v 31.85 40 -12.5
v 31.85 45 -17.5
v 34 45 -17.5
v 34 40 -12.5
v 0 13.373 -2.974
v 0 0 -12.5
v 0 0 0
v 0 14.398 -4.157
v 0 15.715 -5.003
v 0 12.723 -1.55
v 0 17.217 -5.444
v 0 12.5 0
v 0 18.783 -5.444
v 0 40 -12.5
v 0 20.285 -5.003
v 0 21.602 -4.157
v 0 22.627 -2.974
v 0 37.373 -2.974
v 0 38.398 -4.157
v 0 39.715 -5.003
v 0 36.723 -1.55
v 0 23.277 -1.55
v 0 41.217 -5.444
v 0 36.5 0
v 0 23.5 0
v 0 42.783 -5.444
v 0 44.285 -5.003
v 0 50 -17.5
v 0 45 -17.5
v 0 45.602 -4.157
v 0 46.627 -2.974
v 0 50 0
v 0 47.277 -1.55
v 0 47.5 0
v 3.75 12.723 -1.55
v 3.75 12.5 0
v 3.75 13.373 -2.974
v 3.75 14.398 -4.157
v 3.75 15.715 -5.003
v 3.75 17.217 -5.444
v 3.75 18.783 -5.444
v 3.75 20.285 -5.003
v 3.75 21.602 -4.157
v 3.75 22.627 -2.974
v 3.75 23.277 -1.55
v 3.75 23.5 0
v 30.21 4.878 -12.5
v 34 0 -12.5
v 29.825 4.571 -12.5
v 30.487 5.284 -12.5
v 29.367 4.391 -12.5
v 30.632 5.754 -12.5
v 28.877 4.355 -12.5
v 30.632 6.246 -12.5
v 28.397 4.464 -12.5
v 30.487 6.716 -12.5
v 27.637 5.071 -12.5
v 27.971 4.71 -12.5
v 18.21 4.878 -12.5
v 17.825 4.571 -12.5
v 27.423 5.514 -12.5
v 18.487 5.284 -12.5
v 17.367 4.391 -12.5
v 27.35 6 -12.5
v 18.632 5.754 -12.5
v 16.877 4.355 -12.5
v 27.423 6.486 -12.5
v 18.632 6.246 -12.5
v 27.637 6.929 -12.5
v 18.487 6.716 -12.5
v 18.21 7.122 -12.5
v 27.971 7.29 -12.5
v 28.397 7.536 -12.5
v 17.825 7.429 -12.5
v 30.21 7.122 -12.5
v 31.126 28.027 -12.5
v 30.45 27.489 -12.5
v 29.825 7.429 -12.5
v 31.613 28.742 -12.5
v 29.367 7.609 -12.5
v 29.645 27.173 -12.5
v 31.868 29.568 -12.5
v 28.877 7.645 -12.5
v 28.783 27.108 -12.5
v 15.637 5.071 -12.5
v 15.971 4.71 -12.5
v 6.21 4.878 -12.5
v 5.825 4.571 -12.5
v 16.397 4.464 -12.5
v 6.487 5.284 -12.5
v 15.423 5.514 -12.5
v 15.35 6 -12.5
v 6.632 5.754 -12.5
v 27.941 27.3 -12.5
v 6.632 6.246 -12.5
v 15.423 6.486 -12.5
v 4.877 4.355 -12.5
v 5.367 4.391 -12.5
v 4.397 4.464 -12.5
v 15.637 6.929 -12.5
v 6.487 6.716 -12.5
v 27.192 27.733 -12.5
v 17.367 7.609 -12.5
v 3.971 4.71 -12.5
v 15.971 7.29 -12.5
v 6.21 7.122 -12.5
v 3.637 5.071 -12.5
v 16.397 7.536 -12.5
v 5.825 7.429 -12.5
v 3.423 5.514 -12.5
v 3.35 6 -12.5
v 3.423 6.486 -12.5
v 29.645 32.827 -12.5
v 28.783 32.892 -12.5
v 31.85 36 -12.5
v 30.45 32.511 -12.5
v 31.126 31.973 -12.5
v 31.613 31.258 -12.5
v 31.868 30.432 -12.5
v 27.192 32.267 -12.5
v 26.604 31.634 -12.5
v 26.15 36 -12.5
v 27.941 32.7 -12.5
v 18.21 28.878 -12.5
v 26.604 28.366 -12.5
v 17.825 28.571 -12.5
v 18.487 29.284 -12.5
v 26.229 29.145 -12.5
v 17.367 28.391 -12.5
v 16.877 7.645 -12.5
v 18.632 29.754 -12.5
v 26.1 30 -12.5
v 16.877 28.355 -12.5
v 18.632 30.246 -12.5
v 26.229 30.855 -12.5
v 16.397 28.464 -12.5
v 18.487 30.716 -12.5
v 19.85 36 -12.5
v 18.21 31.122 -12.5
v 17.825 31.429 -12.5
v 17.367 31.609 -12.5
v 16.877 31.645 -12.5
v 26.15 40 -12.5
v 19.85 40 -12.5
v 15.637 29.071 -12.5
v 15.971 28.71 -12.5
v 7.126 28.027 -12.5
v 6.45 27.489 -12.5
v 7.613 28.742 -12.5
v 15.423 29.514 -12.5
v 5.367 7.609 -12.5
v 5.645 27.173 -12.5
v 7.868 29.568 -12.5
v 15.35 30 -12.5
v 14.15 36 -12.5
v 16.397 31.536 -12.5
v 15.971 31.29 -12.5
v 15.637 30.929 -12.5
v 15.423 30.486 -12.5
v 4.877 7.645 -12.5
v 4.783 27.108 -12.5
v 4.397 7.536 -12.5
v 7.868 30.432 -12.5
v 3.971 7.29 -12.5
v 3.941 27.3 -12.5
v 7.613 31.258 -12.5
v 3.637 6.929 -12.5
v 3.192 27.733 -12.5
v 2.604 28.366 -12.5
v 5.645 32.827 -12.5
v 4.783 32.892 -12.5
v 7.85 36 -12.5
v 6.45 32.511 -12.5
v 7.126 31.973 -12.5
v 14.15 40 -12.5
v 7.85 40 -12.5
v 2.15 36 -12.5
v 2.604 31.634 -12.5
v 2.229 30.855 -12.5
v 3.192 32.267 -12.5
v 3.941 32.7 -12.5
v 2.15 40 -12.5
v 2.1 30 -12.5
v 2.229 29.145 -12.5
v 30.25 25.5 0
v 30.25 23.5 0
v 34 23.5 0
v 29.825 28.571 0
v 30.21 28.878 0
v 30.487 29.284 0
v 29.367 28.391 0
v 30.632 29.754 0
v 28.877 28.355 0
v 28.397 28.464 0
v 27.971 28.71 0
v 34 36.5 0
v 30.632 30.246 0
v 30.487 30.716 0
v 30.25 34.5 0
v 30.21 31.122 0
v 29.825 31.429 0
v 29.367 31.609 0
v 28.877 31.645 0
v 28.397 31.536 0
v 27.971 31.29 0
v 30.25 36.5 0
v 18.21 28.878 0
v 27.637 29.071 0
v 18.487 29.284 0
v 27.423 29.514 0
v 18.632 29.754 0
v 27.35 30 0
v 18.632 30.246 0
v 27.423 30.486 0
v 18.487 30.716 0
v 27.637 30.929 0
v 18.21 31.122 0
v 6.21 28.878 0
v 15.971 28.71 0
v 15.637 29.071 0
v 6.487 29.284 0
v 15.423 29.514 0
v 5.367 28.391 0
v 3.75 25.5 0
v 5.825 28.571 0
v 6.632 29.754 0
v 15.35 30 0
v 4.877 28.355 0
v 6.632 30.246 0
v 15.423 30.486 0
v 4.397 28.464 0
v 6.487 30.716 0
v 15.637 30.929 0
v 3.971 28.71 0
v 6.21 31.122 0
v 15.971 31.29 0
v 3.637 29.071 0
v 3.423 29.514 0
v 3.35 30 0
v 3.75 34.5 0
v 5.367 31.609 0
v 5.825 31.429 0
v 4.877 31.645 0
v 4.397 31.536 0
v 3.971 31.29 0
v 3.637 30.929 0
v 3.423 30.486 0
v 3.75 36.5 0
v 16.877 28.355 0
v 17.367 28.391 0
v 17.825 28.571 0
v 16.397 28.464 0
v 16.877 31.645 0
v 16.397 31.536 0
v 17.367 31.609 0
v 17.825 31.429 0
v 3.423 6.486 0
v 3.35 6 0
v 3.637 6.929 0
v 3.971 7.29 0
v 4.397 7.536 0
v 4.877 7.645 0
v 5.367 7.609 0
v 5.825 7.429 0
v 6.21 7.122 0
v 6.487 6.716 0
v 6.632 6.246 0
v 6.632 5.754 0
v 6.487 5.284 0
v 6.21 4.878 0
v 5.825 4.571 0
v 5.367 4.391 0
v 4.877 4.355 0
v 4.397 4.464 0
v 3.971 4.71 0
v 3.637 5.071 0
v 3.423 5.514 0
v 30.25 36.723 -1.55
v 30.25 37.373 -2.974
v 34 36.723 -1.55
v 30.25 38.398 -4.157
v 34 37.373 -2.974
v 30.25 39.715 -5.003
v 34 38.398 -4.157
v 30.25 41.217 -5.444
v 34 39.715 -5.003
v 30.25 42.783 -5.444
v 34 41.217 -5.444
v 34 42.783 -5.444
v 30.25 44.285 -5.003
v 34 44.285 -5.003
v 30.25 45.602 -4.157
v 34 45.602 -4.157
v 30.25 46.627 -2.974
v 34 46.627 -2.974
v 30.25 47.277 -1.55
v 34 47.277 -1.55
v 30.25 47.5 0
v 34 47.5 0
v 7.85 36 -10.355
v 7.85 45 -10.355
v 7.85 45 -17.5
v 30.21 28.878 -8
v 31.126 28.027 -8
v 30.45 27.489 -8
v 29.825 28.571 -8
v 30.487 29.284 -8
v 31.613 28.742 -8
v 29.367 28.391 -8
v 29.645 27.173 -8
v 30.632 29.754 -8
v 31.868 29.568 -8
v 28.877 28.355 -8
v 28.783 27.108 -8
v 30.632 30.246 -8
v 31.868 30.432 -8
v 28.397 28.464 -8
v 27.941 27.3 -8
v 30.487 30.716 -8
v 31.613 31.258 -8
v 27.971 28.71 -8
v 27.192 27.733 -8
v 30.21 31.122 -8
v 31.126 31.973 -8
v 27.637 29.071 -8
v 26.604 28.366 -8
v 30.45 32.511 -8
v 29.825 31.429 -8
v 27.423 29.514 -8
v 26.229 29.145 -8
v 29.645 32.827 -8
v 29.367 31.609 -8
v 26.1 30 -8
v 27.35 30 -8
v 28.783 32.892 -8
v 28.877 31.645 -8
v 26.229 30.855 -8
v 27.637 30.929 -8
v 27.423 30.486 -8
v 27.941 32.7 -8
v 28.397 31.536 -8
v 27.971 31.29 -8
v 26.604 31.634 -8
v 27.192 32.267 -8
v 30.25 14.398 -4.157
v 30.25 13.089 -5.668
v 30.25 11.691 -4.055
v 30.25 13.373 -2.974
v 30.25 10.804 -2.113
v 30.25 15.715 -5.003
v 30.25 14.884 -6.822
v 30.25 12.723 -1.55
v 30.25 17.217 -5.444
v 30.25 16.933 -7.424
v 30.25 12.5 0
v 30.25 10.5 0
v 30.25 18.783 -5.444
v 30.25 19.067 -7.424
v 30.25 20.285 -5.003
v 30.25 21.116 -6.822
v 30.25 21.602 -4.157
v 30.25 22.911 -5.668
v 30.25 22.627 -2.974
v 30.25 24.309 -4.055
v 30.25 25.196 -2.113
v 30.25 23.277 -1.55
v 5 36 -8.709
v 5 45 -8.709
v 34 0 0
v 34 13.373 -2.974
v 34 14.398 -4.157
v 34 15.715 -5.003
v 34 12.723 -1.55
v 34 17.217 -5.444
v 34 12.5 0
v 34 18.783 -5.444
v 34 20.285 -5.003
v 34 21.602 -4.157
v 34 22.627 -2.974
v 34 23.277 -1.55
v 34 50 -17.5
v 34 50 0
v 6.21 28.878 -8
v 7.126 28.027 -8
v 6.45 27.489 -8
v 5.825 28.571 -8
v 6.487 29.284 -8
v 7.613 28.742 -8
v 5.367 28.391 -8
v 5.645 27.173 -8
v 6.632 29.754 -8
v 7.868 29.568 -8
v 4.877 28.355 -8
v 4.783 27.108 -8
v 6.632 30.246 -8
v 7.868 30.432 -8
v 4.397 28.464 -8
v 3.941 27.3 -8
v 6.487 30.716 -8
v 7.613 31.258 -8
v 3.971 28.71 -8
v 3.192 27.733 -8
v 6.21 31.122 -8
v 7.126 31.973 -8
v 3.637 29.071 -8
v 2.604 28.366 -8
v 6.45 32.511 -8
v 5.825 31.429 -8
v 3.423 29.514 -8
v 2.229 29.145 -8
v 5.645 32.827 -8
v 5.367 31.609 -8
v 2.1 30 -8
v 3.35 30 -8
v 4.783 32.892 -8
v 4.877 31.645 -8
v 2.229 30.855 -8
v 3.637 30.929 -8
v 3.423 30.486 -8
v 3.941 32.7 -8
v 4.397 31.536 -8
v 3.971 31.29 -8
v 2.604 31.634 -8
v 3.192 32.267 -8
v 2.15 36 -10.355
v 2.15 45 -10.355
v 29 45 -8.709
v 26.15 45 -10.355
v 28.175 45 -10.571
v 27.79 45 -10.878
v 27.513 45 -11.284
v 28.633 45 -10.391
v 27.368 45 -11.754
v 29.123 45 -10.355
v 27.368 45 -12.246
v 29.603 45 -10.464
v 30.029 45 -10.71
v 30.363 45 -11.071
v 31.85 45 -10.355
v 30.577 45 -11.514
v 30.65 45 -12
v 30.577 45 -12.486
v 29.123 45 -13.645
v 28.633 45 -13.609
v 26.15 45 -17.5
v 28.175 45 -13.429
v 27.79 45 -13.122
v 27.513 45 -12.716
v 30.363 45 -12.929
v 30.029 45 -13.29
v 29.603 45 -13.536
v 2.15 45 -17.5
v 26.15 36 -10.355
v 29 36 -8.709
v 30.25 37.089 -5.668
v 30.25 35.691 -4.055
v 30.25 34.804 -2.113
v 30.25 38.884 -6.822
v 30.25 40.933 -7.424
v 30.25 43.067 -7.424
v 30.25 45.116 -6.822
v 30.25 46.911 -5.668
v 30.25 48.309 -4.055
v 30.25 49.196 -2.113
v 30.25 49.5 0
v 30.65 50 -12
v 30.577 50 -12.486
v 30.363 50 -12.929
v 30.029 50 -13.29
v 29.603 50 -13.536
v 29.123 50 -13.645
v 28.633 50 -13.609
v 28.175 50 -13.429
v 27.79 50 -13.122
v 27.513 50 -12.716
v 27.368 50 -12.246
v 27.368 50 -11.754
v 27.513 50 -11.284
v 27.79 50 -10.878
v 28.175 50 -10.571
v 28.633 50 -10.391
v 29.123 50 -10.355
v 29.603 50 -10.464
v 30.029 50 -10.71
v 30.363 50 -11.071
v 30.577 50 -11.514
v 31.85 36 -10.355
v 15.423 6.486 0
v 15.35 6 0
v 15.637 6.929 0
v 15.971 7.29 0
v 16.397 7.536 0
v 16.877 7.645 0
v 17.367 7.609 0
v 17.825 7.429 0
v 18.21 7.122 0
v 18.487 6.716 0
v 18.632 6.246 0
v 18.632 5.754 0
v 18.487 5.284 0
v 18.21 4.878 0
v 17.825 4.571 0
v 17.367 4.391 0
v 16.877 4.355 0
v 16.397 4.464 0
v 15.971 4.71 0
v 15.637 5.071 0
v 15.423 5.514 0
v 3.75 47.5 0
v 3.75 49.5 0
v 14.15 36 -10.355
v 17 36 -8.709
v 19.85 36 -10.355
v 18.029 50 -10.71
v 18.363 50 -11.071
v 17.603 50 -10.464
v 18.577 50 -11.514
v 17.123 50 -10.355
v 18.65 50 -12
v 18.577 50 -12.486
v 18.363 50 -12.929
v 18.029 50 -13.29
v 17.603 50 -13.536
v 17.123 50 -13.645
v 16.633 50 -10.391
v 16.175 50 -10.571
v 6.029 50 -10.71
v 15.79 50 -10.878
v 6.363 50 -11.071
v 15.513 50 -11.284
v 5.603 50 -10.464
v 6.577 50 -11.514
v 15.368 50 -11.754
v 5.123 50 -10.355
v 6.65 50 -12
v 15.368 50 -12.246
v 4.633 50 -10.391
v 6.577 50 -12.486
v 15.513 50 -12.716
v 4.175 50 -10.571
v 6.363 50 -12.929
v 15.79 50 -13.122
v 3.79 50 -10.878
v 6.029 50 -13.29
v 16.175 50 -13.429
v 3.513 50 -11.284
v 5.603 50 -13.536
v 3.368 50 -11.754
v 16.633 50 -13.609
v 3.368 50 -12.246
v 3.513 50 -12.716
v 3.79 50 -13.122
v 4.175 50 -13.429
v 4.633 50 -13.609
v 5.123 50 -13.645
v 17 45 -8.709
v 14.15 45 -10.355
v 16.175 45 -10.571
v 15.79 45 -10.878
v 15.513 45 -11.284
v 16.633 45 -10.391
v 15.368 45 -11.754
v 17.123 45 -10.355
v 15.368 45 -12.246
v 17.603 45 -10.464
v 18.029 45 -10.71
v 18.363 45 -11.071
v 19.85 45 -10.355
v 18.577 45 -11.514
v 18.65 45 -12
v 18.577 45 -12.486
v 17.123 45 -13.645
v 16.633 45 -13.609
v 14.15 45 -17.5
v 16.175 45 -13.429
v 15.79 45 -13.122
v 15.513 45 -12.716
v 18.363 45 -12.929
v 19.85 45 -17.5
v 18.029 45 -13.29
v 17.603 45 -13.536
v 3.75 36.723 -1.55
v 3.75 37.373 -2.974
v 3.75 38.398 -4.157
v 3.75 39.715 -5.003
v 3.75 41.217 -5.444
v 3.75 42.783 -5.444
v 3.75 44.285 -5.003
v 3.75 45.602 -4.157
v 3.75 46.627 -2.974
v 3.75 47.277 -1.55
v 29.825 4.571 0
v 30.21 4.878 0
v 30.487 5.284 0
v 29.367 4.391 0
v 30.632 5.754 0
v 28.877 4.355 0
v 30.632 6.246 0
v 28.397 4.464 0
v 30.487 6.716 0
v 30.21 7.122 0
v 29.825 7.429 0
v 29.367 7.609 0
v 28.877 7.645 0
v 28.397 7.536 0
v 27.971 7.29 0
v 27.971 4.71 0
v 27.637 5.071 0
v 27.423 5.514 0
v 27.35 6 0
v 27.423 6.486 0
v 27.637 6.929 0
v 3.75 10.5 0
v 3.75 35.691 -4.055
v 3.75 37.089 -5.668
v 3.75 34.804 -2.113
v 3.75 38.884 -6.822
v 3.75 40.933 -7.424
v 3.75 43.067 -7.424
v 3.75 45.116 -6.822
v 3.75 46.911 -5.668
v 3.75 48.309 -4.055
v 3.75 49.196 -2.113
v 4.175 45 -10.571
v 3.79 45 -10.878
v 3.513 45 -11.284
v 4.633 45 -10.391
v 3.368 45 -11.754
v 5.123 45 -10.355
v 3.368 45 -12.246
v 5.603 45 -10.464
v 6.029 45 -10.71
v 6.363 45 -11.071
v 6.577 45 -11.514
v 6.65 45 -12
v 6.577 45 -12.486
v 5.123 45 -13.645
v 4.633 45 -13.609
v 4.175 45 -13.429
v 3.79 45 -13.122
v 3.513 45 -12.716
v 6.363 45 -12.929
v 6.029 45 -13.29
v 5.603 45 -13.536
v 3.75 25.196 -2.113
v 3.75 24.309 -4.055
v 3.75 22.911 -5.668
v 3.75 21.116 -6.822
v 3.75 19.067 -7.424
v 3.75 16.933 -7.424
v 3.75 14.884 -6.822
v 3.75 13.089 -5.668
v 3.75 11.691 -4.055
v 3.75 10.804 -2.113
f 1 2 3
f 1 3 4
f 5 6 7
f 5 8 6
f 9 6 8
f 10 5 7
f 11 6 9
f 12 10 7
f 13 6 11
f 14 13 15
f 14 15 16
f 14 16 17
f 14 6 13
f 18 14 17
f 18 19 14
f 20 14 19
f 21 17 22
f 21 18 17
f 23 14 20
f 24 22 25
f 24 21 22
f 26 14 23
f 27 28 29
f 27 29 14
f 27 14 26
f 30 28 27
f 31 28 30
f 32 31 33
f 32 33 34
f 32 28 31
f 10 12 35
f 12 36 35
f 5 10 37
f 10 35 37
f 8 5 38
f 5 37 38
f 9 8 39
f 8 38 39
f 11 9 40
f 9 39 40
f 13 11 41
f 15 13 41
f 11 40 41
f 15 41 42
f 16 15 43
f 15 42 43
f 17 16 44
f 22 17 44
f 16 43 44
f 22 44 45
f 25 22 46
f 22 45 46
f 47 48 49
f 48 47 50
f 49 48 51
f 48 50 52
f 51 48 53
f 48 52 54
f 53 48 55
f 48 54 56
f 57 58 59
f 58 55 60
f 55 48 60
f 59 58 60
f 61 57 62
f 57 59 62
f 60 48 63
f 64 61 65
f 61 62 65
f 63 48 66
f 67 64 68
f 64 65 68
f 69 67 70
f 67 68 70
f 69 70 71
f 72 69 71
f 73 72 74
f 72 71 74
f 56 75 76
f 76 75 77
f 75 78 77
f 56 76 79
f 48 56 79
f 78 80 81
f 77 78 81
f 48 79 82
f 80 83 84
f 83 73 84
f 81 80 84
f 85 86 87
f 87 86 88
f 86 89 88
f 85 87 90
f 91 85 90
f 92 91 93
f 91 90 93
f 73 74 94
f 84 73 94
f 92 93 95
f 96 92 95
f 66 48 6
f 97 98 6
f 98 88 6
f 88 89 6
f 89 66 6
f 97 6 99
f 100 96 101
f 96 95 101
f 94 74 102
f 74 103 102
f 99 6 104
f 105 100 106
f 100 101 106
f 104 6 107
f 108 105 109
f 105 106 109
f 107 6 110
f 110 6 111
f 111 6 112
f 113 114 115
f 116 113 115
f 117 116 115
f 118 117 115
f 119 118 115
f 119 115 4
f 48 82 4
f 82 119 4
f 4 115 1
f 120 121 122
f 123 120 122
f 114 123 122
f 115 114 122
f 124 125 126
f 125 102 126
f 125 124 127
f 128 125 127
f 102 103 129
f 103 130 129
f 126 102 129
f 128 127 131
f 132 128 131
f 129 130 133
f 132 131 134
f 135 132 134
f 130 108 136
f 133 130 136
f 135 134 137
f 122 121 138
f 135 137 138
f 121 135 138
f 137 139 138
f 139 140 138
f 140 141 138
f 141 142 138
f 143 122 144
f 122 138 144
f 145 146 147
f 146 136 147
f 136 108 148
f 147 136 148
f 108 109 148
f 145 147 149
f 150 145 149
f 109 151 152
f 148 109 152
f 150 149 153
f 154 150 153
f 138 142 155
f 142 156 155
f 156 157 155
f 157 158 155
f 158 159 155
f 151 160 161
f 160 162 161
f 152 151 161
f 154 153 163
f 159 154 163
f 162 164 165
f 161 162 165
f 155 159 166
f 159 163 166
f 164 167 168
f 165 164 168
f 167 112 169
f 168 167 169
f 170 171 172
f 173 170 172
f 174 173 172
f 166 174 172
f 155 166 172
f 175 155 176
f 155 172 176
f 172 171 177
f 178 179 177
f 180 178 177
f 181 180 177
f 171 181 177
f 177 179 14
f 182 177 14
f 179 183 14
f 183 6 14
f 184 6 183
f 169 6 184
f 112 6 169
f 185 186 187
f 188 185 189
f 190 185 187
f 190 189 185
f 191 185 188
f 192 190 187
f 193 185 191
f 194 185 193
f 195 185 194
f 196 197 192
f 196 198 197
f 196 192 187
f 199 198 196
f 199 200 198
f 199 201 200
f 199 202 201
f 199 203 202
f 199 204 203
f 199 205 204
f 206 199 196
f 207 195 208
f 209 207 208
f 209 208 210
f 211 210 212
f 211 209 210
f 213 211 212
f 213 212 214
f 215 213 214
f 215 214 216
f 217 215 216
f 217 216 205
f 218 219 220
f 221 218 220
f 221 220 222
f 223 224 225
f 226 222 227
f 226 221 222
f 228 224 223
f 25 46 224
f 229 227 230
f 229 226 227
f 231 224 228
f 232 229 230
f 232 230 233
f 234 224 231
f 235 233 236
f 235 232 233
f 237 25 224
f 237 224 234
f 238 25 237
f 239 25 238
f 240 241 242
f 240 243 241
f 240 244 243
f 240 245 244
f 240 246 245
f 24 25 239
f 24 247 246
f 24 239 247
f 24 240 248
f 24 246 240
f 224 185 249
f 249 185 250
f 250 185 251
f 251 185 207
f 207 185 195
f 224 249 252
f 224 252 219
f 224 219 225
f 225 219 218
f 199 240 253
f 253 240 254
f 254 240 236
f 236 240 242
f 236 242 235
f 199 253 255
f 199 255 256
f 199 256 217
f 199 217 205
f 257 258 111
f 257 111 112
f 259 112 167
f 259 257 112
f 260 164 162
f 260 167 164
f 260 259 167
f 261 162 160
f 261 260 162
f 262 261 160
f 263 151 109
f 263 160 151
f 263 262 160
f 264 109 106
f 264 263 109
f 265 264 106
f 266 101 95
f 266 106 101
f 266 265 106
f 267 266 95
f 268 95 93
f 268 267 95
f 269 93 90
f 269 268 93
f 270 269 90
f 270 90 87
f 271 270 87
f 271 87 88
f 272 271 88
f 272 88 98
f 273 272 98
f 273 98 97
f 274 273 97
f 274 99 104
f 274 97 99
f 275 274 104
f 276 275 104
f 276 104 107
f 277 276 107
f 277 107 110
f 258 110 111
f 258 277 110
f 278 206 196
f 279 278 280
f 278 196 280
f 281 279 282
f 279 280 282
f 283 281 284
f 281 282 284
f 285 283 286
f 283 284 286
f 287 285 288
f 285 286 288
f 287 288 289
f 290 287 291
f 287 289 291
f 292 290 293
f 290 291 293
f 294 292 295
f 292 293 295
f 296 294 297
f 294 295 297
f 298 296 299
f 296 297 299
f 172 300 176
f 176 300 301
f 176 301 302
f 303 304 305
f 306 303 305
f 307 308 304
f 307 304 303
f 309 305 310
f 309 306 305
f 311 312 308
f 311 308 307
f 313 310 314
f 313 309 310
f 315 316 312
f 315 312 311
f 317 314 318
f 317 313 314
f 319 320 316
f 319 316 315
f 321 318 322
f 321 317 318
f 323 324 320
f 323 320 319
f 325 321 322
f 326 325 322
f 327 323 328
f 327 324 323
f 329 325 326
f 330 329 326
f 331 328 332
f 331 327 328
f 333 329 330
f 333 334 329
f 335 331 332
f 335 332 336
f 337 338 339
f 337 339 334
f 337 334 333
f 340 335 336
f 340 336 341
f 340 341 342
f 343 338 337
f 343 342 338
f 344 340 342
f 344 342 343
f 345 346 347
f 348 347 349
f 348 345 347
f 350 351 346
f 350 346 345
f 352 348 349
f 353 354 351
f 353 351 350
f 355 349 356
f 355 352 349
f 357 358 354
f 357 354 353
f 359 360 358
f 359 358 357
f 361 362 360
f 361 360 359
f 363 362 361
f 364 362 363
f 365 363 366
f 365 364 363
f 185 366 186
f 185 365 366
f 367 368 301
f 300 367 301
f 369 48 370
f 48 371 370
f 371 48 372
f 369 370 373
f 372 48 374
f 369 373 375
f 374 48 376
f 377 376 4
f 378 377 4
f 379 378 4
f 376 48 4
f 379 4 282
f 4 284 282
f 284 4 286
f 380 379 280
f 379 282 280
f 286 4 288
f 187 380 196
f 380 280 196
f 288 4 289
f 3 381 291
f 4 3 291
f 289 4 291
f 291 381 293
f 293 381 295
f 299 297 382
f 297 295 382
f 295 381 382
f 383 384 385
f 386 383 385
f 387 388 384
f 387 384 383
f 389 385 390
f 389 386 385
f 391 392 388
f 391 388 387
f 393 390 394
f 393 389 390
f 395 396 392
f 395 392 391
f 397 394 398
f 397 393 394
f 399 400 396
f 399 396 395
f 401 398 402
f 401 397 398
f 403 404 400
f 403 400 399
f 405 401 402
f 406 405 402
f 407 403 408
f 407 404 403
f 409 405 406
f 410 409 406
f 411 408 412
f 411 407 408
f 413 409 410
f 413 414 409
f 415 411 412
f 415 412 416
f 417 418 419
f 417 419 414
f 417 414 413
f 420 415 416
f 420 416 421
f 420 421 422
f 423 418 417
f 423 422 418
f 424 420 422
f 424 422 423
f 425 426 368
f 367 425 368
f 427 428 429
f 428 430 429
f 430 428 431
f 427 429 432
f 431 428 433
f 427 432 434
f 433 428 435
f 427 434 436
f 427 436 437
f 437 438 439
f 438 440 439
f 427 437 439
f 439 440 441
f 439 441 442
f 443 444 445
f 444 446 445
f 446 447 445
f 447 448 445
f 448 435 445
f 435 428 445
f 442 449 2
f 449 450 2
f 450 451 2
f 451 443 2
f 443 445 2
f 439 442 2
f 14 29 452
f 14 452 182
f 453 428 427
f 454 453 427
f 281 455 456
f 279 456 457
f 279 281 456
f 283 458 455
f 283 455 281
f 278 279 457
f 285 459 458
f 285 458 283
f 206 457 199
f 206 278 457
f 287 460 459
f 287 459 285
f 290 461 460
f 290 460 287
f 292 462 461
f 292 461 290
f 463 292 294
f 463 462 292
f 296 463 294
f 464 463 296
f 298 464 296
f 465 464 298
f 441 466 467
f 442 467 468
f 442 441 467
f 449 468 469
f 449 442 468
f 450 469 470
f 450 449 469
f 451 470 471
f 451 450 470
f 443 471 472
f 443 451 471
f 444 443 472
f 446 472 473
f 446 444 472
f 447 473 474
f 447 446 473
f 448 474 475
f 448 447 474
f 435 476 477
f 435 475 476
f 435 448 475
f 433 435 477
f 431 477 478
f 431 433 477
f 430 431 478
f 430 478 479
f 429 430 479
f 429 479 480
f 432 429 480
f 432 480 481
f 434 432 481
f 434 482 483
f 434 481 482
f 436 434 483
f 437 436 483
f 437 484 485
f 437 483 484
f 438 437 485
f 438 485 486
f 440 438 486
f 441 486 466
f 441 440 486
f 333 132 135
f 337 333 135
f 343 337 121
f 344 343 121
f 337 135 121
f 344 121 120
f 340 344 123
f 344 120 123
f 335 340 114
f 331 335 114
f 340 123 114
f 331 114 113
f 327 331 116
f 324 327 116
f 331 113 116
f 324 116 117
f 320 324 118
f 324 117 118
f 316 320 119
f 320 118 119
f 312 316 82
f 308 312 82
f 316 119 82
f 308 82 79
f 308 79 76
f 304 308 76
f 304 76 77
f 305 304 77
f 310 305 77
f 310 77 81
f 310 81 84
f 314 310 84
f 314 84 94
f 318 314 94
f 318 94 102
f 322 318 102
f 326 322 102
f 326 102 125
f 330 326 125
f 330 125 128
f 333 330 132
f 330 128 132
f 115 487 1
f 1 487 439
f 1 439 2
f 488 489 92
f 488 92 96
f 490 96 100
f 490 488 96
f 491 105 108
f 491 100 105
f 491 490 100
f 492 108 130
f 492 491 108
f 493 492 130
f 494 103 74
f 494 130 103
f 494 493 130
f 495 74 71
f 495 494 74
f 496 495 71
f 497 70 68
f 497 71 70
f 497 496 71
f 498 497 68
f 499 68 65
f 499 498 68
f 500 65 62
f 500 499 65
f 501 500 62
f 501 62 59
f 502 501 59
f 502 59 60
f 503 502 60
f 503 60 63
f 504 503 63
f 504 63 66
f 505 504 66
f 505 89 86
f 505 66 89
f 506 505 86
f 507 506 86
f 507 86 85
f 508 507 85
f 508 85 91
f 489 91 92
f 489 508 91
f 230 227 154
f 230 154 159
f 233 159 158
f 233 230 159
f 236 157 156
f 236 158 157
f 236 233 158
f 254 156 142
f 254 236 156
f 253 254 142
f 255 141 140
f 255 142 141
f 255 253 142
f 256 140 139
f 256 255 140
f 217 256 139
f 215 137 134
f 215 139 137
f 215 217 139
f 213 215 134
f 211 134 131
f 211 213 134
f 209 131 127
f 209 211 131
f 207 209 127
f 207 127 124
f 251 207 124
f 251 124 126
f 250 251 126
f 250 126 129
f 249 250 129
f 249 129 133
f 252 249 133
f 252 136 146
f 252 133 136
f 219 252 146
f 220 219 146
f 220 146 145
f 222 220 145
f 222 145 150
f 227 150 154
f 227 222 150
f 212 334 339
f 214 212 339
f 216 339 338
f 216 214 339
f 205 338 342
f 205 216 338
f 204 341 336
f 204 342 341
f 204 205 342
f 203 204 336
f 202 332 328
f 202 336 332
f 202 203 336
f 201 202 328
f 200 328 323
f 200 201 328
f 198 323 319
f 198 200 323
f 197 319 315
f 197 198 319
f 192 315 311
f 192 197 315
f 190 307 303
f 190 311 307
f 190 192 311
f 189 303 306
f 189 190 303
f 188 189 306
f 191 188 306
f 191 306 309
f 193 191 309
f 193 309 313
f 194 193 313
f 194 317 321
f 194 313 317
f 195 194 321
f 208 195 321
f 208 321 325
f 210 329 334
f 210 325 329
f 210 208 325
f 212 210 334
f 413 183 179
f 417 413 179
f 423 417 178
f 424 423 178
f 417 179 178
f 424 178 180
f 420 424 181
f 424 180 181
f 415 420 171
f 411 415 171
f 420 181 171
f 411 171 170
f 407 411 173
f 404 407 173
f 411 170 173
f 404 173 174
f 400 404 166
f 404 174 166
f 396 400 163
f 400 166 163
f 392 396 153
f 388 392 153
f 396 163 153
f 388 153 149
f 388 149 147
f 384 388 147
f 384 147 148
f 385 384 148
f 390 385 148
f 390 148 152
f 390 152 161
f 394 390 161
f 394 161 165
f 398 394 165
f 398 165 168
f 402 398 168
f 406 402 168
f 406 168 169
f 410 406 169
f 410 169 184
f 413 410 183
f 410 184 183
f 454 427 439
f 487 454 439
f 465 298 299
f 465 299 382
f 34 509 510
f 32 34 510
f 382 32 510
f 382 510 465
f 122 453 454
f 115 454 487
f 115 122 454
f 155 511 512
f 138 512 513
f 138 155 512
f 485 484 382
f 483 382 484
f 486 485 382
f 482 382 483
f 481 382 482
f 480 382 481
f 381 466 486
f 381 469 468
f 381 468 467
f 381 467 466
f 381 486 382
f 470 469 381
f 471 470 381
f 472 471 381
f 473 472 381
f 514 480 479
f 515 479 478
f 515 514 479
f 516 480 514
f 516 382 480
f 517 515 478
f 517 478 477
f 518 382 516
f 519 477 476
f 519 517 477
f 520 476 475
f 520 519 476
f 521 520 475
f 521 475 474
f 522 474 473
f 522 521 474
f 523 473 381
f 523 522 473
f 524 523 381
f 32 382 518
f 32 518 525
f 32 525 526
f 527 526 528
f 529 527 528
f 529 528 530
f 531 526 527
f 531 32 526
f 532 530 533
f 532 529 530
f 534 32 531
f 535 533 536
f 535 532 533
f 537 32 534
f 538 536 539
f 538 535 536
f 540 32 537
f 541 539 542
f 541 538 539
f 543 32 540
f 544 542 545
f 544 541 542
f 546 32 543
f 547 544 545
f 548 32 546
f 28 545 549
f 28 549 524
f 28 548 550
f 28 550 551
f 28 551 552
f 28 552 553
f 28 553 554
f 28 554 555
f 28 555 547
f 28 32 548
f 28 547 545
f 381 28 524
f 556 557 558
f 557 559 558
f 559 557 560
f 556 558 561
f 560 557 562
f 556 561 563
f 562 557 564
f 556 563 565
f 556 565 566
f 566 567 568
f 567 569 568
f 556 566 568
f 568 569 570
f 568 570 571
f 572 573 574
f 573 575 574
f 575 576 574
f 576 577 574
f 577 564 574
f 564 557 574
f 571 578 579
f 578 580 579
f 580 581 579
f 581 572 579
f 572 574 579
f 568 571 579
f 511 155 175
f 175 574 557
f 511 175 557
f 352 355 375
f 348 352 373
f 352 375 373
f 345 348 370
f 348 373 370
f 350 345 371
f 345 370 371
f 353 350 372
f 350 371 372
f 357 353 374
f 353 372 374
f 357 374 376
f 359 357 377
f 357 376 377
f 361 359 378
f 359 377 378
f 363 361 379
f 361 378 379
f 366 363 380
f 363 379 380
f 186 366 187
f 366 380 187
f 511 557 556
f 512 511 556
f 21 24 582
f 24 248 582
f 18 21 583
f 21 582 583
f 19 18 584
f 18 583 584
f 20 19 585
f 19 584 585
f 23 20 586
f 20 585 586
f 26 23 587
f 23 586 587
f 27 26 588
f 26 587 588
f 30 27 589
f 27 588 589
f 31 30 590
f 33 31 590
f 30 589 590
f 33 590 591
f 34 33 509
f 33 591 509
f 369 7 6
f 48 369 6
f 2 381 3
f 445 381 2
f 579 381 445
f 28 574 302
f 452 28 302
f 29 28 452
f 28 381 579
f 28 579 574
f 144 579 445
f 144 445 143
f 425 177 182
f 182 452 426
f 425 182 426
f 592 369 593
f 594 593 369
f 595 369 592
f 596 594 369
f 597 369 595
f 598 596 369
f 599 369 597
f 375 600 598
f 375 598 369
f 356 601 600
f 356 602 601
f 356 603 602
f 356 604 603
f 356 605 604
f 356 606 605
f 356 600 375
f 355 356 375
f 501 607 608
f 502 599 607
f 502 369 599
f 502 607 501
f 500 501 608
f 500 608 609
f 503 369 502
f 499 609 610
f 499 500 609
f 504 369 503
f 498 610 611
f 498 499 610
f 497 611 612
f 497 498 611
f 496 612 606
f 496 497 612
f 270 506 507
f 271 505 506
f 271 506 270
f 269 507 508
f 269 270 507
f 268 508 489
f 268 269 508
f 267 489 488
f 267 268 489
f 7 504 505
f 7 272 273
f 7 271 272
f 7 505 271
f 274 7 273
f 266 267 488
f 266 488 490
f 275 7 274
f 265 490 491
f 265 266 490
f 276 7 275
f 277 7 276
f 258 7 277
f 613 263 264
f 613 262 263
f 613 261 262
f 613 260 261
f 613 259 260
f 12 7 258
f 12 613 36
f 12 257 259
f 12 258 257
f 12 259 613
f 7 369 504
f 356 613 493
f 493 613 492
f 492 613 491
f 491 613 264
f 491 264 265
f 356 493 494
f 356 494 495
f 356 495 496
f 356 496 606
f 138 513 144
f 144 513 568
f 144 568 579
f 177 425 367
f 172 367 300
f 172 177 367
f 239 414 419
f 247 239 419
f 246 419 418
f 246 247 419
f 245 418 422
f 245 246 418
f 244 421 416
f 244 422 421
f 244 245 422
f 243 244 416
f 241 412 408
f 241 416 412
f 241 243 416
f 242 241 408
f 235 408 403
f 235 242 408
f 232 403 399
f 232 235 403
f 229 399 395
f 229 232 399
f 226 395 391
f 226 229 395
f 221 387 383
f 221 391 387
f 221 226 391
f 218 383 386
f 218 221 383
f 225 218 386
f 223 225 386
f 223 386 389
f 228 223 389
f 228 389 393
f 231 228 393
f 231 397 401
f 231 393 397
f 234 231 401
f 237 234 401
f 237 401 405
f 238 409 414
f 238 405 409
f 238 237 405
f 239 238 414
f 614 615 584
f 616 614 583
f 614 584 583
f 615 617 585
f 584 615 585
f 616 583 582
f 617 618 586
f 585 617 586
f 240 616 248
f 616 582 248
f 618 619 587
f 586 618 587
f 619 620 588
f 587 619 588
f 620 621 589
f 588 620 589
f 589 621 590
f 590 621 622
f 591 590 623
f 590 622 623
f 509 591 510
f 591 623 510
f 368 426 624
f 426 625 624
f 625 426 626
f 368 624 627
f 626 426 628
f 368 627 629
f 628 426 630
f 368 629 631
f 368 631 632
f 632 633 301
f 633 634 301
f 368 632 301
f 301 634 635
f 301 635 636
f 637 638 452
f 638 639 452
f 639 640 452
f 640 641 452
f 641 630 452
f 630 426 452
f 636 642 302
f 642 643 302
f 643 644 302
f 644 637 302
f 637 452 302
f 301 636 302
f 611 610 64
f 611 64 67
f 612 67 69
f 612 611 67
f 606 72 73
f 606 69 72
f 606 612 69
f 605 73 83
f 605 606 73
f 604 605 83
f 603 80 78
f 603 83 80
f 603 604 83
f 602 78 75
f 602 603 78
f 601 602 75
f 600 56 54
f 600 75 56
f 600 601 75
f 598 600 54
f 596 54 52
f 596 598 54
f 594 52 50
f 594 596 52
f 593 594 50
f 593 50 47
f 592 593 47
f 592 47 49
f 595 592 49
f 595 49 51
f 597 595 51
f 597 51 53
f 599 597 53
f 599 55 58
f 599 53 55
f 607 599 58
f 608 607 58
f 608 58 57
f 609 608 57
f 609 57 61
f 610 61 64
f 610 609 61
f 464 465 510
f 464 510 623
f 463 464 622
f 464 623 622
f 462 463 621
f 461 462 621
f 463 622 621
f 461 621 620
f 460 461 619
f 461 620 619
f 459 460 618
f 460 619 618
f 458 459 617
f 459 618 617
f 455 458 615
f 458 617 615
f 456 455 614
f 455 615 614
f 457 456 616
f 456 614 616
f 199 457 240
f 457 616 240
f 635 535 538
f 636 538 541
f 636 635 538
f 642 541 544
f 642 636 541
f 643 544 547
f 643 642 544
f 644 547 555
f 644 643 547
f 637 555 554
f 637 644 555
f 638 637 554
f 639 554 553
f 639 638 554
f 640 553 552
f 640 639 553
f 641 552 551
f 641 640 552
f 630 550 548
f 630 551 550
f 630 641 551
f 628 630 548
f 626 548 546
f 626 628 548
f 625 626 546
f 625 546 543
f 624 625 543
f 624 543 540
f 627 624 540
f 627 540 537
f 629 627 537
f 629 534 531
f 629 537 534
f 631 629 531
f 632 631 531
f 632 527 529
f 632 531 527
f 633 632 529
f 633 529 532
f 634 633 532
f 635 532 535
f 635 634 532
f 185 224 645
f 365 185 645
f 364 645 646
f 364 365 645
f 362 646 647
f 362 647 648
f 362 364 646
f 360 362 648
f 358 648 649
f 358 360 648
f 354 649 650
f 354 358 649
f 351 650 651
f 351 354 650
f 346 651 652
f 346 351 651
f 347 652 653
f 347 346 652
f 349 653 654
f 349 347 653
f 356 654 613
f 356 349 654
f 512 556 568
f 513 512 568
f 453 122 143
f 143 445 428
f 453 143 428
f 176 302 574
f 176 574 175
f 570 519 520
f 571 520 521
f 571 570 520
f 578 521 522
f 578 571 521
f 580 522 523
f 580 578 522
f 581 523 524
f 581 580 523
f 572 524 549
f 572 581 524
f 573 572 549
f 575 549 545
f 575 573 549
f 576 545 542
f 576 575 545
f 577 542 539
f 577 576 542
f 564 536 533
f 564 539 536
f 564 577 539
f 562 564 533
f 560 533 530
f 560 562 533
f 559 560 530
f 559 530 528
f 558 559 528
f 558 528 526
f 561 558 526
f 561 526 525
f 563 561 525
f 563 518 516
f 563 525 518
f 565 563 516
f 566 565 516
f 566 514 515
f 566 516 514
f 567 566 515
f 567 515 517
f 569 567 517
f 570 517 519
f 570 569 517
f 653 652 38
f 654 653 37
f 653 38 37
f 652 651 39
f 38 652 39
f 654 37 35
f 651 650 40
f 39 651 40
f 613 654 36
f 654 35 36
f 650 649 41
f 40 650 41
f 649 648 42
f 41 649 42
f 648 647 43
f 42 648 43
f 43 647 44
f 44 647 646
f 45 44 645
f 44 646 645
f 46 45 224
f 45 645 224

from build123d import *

# Parameters (mm, degrees)
SKETCH_1_W             = 12.5
SKETCH_1_H             = 50
EXTRUDE_1_DEPTH        = 34
SKETCH_2_R             = 7.5
CUT_EXTRUDE_1_DEPTH    = 13.25
CUT_EXTRUDE_START      = -13.5
SKETCH_3_R             = 1.65
CUT_EXTRUDE_2_DEPTH    = 14.5
SKETCH_4_R             = 2.9
CUT_EXTRUDE_3_DEPTH    = 4.5
SKETCH_5_R             = 5.5
CUT_EXTRUDE_4_DEPTH    = 35
EXTRUDE_2_DEPTH        = 17
SKETCH_9_R             = 1.65
CUT_EXTRUDE_6_DEPTH    = 6
CUT_EXTRUDE_5_DEPTH    = 9
PATTERN_LINEAR_1_COUNT = 2
PATTERN_LINEAR_1_PITCH = 24


with BuildPart() as part:
    # 草图1 → 凸台-拉伸1 (new body)
    with BuildSketch(Plane(origin=(0, 0, 0), x_dir=(0, 0, -1), z_dir=(1, 0, 0))):
        with Locations((6.25, 25)):
            Rectangle(SKETCH_1_W, SKETCH_1_H)
    extrude(amount=EXTRUDE_1_DEPTH)

    # 草图2 → 切除-拉伸1 (cut, symmetric)
    with BuildSketch(Plane.ZY.offset(-17)):
        with Locations((0, 18)):
            Circle(SKETCH_2_R)
        with Locations((0, 42)):
            Circle(SKETCH_2_R)
    extrude(amount=CUT_EXTRUDE_1_DEPTH, both=True, mode=Mode.SUBTRACT)

    # 草图3 → 切除-拉伸2 (cut)
    with BuildSketch(Plane(origin=(0, 0, -12.5), x_dir=(-1, 0, 0), z_dir=(0, 0, -1)).offset(CUT_EXTRUDE_START)):
        with Locations((-29, 30)):
            Circle(SKETCH_3_R)
        with Locations((-5, 30)):
            Circle(SKETCH_3_R)
        with Locations((-17, 30)):
            Circle(SKETCH_3_R)
    cut_extrude_2 = extrude(amount=CUT_EXTRUDE_2_DEPTH, mode=Mode.SUBTRACT)

    # 草图4 → 切除-拉伸3 (cut)
    with BuildSketch(Plane(origin=(0, 0, -12.5), x_dir=(-1, 0, 0), z_dir=(0, 0, -1))):
        with Locations((-29, 30)):
            Circle(SKETCH_4_R)
        with Locations((-5, 30)):
            Circle(SKETCH_4_R)
    extrude(amount=-CUT_EXTRUDE_3_DEPTH, mode=Mode.SUBTRACT)

    # 草图5 → 切除-拉伸4 (cut, through all)
    with BuildSketch(Plane(origin=(34, 0, 0), x_dir=(0, 0, -1), z_dir=(1, 0, 0))):
        with Locations((0, 18)):
            Circle(SKETCH_5_R)
        with Locations((0, 42)):
            Circle(SKETCH_5_R)
    extrude(amount=-CUT_EXTRUDE_4_DEPTH, mode=Mode.SUBTRACT)

    # 草图6 → 凸台-拉伸2 (add, symmetric)
    with BuildSketch(Plane.ZY.offset(-17)):
        Polygon((-12.5, 50), (-17.5, 50), (-17.5, 45), (-12.5, 40), align=None)
    extrude(amount=EXTRUDE_2_DEPTH, both=True)

    # 草图9 → 切除-拉伸6 (cut, through all)
    with BuildSketch(Plane(origin=(0, 45, 0), x_dir=(1, 0, 0), z_dir=(0, 1, 0))):
        with Locations((5, 12)):
            Circle(SKETCH_9_R)
        with Locations((17, 12)):
            Circle(SKETCH_9_R)
        with Locations((29, 12)):
            Circle(SKETCH_9_R)
    extrude(amount=CUT_EXTRUDE_6_DEPTH, mode=Mode.SUBTRACT)

    # 草图7 → 切除-拉伸5 (cut)
    with BuildSketch(Plane(origin=(0, 45, 0), x_dir=(1, 0, 0), z_dir=(0, 1, 0))):
        Polygon((7.85, 10.354551733), (7.85, 13.090838694), (7.85, 17.5), (2.15, 17.5), (2.15, 12.981963635), (2.15, 10.354551733), (5, 8.709103466), align=None)
        Polygon((19.85, 10.354551733), (19.85, 13.090959175), (19.85, 17.5), (14.15, 17.5), (14.15, 12.981963635), (14.15, 10.354551733), (17, 8.709103466), align=None)
        Polygon((31.85, 10.354551733), (31.85, 13.090958614), (31.85, 17.5), (26.15, 17.5), (26.15, 12.981963635), (26.15, 10.354551733), (29, 8.709103466), align=None)
    extrude(amount=-CUT_EXTRUDE_5_DEPTH, mode=Mode.SUBTRACT)

    # 阵列(线性)1: 切除-拉伸2 ×2
    with Locations(*[(0, -i * PATTERN_LINEAR_1_PITCH, 0) for i in range(1, PATTERN_LINEAR_1_COUNT)]):
        add(cut_extrude_2, mode=Mode.SUBTRACT)


solid = part.part
